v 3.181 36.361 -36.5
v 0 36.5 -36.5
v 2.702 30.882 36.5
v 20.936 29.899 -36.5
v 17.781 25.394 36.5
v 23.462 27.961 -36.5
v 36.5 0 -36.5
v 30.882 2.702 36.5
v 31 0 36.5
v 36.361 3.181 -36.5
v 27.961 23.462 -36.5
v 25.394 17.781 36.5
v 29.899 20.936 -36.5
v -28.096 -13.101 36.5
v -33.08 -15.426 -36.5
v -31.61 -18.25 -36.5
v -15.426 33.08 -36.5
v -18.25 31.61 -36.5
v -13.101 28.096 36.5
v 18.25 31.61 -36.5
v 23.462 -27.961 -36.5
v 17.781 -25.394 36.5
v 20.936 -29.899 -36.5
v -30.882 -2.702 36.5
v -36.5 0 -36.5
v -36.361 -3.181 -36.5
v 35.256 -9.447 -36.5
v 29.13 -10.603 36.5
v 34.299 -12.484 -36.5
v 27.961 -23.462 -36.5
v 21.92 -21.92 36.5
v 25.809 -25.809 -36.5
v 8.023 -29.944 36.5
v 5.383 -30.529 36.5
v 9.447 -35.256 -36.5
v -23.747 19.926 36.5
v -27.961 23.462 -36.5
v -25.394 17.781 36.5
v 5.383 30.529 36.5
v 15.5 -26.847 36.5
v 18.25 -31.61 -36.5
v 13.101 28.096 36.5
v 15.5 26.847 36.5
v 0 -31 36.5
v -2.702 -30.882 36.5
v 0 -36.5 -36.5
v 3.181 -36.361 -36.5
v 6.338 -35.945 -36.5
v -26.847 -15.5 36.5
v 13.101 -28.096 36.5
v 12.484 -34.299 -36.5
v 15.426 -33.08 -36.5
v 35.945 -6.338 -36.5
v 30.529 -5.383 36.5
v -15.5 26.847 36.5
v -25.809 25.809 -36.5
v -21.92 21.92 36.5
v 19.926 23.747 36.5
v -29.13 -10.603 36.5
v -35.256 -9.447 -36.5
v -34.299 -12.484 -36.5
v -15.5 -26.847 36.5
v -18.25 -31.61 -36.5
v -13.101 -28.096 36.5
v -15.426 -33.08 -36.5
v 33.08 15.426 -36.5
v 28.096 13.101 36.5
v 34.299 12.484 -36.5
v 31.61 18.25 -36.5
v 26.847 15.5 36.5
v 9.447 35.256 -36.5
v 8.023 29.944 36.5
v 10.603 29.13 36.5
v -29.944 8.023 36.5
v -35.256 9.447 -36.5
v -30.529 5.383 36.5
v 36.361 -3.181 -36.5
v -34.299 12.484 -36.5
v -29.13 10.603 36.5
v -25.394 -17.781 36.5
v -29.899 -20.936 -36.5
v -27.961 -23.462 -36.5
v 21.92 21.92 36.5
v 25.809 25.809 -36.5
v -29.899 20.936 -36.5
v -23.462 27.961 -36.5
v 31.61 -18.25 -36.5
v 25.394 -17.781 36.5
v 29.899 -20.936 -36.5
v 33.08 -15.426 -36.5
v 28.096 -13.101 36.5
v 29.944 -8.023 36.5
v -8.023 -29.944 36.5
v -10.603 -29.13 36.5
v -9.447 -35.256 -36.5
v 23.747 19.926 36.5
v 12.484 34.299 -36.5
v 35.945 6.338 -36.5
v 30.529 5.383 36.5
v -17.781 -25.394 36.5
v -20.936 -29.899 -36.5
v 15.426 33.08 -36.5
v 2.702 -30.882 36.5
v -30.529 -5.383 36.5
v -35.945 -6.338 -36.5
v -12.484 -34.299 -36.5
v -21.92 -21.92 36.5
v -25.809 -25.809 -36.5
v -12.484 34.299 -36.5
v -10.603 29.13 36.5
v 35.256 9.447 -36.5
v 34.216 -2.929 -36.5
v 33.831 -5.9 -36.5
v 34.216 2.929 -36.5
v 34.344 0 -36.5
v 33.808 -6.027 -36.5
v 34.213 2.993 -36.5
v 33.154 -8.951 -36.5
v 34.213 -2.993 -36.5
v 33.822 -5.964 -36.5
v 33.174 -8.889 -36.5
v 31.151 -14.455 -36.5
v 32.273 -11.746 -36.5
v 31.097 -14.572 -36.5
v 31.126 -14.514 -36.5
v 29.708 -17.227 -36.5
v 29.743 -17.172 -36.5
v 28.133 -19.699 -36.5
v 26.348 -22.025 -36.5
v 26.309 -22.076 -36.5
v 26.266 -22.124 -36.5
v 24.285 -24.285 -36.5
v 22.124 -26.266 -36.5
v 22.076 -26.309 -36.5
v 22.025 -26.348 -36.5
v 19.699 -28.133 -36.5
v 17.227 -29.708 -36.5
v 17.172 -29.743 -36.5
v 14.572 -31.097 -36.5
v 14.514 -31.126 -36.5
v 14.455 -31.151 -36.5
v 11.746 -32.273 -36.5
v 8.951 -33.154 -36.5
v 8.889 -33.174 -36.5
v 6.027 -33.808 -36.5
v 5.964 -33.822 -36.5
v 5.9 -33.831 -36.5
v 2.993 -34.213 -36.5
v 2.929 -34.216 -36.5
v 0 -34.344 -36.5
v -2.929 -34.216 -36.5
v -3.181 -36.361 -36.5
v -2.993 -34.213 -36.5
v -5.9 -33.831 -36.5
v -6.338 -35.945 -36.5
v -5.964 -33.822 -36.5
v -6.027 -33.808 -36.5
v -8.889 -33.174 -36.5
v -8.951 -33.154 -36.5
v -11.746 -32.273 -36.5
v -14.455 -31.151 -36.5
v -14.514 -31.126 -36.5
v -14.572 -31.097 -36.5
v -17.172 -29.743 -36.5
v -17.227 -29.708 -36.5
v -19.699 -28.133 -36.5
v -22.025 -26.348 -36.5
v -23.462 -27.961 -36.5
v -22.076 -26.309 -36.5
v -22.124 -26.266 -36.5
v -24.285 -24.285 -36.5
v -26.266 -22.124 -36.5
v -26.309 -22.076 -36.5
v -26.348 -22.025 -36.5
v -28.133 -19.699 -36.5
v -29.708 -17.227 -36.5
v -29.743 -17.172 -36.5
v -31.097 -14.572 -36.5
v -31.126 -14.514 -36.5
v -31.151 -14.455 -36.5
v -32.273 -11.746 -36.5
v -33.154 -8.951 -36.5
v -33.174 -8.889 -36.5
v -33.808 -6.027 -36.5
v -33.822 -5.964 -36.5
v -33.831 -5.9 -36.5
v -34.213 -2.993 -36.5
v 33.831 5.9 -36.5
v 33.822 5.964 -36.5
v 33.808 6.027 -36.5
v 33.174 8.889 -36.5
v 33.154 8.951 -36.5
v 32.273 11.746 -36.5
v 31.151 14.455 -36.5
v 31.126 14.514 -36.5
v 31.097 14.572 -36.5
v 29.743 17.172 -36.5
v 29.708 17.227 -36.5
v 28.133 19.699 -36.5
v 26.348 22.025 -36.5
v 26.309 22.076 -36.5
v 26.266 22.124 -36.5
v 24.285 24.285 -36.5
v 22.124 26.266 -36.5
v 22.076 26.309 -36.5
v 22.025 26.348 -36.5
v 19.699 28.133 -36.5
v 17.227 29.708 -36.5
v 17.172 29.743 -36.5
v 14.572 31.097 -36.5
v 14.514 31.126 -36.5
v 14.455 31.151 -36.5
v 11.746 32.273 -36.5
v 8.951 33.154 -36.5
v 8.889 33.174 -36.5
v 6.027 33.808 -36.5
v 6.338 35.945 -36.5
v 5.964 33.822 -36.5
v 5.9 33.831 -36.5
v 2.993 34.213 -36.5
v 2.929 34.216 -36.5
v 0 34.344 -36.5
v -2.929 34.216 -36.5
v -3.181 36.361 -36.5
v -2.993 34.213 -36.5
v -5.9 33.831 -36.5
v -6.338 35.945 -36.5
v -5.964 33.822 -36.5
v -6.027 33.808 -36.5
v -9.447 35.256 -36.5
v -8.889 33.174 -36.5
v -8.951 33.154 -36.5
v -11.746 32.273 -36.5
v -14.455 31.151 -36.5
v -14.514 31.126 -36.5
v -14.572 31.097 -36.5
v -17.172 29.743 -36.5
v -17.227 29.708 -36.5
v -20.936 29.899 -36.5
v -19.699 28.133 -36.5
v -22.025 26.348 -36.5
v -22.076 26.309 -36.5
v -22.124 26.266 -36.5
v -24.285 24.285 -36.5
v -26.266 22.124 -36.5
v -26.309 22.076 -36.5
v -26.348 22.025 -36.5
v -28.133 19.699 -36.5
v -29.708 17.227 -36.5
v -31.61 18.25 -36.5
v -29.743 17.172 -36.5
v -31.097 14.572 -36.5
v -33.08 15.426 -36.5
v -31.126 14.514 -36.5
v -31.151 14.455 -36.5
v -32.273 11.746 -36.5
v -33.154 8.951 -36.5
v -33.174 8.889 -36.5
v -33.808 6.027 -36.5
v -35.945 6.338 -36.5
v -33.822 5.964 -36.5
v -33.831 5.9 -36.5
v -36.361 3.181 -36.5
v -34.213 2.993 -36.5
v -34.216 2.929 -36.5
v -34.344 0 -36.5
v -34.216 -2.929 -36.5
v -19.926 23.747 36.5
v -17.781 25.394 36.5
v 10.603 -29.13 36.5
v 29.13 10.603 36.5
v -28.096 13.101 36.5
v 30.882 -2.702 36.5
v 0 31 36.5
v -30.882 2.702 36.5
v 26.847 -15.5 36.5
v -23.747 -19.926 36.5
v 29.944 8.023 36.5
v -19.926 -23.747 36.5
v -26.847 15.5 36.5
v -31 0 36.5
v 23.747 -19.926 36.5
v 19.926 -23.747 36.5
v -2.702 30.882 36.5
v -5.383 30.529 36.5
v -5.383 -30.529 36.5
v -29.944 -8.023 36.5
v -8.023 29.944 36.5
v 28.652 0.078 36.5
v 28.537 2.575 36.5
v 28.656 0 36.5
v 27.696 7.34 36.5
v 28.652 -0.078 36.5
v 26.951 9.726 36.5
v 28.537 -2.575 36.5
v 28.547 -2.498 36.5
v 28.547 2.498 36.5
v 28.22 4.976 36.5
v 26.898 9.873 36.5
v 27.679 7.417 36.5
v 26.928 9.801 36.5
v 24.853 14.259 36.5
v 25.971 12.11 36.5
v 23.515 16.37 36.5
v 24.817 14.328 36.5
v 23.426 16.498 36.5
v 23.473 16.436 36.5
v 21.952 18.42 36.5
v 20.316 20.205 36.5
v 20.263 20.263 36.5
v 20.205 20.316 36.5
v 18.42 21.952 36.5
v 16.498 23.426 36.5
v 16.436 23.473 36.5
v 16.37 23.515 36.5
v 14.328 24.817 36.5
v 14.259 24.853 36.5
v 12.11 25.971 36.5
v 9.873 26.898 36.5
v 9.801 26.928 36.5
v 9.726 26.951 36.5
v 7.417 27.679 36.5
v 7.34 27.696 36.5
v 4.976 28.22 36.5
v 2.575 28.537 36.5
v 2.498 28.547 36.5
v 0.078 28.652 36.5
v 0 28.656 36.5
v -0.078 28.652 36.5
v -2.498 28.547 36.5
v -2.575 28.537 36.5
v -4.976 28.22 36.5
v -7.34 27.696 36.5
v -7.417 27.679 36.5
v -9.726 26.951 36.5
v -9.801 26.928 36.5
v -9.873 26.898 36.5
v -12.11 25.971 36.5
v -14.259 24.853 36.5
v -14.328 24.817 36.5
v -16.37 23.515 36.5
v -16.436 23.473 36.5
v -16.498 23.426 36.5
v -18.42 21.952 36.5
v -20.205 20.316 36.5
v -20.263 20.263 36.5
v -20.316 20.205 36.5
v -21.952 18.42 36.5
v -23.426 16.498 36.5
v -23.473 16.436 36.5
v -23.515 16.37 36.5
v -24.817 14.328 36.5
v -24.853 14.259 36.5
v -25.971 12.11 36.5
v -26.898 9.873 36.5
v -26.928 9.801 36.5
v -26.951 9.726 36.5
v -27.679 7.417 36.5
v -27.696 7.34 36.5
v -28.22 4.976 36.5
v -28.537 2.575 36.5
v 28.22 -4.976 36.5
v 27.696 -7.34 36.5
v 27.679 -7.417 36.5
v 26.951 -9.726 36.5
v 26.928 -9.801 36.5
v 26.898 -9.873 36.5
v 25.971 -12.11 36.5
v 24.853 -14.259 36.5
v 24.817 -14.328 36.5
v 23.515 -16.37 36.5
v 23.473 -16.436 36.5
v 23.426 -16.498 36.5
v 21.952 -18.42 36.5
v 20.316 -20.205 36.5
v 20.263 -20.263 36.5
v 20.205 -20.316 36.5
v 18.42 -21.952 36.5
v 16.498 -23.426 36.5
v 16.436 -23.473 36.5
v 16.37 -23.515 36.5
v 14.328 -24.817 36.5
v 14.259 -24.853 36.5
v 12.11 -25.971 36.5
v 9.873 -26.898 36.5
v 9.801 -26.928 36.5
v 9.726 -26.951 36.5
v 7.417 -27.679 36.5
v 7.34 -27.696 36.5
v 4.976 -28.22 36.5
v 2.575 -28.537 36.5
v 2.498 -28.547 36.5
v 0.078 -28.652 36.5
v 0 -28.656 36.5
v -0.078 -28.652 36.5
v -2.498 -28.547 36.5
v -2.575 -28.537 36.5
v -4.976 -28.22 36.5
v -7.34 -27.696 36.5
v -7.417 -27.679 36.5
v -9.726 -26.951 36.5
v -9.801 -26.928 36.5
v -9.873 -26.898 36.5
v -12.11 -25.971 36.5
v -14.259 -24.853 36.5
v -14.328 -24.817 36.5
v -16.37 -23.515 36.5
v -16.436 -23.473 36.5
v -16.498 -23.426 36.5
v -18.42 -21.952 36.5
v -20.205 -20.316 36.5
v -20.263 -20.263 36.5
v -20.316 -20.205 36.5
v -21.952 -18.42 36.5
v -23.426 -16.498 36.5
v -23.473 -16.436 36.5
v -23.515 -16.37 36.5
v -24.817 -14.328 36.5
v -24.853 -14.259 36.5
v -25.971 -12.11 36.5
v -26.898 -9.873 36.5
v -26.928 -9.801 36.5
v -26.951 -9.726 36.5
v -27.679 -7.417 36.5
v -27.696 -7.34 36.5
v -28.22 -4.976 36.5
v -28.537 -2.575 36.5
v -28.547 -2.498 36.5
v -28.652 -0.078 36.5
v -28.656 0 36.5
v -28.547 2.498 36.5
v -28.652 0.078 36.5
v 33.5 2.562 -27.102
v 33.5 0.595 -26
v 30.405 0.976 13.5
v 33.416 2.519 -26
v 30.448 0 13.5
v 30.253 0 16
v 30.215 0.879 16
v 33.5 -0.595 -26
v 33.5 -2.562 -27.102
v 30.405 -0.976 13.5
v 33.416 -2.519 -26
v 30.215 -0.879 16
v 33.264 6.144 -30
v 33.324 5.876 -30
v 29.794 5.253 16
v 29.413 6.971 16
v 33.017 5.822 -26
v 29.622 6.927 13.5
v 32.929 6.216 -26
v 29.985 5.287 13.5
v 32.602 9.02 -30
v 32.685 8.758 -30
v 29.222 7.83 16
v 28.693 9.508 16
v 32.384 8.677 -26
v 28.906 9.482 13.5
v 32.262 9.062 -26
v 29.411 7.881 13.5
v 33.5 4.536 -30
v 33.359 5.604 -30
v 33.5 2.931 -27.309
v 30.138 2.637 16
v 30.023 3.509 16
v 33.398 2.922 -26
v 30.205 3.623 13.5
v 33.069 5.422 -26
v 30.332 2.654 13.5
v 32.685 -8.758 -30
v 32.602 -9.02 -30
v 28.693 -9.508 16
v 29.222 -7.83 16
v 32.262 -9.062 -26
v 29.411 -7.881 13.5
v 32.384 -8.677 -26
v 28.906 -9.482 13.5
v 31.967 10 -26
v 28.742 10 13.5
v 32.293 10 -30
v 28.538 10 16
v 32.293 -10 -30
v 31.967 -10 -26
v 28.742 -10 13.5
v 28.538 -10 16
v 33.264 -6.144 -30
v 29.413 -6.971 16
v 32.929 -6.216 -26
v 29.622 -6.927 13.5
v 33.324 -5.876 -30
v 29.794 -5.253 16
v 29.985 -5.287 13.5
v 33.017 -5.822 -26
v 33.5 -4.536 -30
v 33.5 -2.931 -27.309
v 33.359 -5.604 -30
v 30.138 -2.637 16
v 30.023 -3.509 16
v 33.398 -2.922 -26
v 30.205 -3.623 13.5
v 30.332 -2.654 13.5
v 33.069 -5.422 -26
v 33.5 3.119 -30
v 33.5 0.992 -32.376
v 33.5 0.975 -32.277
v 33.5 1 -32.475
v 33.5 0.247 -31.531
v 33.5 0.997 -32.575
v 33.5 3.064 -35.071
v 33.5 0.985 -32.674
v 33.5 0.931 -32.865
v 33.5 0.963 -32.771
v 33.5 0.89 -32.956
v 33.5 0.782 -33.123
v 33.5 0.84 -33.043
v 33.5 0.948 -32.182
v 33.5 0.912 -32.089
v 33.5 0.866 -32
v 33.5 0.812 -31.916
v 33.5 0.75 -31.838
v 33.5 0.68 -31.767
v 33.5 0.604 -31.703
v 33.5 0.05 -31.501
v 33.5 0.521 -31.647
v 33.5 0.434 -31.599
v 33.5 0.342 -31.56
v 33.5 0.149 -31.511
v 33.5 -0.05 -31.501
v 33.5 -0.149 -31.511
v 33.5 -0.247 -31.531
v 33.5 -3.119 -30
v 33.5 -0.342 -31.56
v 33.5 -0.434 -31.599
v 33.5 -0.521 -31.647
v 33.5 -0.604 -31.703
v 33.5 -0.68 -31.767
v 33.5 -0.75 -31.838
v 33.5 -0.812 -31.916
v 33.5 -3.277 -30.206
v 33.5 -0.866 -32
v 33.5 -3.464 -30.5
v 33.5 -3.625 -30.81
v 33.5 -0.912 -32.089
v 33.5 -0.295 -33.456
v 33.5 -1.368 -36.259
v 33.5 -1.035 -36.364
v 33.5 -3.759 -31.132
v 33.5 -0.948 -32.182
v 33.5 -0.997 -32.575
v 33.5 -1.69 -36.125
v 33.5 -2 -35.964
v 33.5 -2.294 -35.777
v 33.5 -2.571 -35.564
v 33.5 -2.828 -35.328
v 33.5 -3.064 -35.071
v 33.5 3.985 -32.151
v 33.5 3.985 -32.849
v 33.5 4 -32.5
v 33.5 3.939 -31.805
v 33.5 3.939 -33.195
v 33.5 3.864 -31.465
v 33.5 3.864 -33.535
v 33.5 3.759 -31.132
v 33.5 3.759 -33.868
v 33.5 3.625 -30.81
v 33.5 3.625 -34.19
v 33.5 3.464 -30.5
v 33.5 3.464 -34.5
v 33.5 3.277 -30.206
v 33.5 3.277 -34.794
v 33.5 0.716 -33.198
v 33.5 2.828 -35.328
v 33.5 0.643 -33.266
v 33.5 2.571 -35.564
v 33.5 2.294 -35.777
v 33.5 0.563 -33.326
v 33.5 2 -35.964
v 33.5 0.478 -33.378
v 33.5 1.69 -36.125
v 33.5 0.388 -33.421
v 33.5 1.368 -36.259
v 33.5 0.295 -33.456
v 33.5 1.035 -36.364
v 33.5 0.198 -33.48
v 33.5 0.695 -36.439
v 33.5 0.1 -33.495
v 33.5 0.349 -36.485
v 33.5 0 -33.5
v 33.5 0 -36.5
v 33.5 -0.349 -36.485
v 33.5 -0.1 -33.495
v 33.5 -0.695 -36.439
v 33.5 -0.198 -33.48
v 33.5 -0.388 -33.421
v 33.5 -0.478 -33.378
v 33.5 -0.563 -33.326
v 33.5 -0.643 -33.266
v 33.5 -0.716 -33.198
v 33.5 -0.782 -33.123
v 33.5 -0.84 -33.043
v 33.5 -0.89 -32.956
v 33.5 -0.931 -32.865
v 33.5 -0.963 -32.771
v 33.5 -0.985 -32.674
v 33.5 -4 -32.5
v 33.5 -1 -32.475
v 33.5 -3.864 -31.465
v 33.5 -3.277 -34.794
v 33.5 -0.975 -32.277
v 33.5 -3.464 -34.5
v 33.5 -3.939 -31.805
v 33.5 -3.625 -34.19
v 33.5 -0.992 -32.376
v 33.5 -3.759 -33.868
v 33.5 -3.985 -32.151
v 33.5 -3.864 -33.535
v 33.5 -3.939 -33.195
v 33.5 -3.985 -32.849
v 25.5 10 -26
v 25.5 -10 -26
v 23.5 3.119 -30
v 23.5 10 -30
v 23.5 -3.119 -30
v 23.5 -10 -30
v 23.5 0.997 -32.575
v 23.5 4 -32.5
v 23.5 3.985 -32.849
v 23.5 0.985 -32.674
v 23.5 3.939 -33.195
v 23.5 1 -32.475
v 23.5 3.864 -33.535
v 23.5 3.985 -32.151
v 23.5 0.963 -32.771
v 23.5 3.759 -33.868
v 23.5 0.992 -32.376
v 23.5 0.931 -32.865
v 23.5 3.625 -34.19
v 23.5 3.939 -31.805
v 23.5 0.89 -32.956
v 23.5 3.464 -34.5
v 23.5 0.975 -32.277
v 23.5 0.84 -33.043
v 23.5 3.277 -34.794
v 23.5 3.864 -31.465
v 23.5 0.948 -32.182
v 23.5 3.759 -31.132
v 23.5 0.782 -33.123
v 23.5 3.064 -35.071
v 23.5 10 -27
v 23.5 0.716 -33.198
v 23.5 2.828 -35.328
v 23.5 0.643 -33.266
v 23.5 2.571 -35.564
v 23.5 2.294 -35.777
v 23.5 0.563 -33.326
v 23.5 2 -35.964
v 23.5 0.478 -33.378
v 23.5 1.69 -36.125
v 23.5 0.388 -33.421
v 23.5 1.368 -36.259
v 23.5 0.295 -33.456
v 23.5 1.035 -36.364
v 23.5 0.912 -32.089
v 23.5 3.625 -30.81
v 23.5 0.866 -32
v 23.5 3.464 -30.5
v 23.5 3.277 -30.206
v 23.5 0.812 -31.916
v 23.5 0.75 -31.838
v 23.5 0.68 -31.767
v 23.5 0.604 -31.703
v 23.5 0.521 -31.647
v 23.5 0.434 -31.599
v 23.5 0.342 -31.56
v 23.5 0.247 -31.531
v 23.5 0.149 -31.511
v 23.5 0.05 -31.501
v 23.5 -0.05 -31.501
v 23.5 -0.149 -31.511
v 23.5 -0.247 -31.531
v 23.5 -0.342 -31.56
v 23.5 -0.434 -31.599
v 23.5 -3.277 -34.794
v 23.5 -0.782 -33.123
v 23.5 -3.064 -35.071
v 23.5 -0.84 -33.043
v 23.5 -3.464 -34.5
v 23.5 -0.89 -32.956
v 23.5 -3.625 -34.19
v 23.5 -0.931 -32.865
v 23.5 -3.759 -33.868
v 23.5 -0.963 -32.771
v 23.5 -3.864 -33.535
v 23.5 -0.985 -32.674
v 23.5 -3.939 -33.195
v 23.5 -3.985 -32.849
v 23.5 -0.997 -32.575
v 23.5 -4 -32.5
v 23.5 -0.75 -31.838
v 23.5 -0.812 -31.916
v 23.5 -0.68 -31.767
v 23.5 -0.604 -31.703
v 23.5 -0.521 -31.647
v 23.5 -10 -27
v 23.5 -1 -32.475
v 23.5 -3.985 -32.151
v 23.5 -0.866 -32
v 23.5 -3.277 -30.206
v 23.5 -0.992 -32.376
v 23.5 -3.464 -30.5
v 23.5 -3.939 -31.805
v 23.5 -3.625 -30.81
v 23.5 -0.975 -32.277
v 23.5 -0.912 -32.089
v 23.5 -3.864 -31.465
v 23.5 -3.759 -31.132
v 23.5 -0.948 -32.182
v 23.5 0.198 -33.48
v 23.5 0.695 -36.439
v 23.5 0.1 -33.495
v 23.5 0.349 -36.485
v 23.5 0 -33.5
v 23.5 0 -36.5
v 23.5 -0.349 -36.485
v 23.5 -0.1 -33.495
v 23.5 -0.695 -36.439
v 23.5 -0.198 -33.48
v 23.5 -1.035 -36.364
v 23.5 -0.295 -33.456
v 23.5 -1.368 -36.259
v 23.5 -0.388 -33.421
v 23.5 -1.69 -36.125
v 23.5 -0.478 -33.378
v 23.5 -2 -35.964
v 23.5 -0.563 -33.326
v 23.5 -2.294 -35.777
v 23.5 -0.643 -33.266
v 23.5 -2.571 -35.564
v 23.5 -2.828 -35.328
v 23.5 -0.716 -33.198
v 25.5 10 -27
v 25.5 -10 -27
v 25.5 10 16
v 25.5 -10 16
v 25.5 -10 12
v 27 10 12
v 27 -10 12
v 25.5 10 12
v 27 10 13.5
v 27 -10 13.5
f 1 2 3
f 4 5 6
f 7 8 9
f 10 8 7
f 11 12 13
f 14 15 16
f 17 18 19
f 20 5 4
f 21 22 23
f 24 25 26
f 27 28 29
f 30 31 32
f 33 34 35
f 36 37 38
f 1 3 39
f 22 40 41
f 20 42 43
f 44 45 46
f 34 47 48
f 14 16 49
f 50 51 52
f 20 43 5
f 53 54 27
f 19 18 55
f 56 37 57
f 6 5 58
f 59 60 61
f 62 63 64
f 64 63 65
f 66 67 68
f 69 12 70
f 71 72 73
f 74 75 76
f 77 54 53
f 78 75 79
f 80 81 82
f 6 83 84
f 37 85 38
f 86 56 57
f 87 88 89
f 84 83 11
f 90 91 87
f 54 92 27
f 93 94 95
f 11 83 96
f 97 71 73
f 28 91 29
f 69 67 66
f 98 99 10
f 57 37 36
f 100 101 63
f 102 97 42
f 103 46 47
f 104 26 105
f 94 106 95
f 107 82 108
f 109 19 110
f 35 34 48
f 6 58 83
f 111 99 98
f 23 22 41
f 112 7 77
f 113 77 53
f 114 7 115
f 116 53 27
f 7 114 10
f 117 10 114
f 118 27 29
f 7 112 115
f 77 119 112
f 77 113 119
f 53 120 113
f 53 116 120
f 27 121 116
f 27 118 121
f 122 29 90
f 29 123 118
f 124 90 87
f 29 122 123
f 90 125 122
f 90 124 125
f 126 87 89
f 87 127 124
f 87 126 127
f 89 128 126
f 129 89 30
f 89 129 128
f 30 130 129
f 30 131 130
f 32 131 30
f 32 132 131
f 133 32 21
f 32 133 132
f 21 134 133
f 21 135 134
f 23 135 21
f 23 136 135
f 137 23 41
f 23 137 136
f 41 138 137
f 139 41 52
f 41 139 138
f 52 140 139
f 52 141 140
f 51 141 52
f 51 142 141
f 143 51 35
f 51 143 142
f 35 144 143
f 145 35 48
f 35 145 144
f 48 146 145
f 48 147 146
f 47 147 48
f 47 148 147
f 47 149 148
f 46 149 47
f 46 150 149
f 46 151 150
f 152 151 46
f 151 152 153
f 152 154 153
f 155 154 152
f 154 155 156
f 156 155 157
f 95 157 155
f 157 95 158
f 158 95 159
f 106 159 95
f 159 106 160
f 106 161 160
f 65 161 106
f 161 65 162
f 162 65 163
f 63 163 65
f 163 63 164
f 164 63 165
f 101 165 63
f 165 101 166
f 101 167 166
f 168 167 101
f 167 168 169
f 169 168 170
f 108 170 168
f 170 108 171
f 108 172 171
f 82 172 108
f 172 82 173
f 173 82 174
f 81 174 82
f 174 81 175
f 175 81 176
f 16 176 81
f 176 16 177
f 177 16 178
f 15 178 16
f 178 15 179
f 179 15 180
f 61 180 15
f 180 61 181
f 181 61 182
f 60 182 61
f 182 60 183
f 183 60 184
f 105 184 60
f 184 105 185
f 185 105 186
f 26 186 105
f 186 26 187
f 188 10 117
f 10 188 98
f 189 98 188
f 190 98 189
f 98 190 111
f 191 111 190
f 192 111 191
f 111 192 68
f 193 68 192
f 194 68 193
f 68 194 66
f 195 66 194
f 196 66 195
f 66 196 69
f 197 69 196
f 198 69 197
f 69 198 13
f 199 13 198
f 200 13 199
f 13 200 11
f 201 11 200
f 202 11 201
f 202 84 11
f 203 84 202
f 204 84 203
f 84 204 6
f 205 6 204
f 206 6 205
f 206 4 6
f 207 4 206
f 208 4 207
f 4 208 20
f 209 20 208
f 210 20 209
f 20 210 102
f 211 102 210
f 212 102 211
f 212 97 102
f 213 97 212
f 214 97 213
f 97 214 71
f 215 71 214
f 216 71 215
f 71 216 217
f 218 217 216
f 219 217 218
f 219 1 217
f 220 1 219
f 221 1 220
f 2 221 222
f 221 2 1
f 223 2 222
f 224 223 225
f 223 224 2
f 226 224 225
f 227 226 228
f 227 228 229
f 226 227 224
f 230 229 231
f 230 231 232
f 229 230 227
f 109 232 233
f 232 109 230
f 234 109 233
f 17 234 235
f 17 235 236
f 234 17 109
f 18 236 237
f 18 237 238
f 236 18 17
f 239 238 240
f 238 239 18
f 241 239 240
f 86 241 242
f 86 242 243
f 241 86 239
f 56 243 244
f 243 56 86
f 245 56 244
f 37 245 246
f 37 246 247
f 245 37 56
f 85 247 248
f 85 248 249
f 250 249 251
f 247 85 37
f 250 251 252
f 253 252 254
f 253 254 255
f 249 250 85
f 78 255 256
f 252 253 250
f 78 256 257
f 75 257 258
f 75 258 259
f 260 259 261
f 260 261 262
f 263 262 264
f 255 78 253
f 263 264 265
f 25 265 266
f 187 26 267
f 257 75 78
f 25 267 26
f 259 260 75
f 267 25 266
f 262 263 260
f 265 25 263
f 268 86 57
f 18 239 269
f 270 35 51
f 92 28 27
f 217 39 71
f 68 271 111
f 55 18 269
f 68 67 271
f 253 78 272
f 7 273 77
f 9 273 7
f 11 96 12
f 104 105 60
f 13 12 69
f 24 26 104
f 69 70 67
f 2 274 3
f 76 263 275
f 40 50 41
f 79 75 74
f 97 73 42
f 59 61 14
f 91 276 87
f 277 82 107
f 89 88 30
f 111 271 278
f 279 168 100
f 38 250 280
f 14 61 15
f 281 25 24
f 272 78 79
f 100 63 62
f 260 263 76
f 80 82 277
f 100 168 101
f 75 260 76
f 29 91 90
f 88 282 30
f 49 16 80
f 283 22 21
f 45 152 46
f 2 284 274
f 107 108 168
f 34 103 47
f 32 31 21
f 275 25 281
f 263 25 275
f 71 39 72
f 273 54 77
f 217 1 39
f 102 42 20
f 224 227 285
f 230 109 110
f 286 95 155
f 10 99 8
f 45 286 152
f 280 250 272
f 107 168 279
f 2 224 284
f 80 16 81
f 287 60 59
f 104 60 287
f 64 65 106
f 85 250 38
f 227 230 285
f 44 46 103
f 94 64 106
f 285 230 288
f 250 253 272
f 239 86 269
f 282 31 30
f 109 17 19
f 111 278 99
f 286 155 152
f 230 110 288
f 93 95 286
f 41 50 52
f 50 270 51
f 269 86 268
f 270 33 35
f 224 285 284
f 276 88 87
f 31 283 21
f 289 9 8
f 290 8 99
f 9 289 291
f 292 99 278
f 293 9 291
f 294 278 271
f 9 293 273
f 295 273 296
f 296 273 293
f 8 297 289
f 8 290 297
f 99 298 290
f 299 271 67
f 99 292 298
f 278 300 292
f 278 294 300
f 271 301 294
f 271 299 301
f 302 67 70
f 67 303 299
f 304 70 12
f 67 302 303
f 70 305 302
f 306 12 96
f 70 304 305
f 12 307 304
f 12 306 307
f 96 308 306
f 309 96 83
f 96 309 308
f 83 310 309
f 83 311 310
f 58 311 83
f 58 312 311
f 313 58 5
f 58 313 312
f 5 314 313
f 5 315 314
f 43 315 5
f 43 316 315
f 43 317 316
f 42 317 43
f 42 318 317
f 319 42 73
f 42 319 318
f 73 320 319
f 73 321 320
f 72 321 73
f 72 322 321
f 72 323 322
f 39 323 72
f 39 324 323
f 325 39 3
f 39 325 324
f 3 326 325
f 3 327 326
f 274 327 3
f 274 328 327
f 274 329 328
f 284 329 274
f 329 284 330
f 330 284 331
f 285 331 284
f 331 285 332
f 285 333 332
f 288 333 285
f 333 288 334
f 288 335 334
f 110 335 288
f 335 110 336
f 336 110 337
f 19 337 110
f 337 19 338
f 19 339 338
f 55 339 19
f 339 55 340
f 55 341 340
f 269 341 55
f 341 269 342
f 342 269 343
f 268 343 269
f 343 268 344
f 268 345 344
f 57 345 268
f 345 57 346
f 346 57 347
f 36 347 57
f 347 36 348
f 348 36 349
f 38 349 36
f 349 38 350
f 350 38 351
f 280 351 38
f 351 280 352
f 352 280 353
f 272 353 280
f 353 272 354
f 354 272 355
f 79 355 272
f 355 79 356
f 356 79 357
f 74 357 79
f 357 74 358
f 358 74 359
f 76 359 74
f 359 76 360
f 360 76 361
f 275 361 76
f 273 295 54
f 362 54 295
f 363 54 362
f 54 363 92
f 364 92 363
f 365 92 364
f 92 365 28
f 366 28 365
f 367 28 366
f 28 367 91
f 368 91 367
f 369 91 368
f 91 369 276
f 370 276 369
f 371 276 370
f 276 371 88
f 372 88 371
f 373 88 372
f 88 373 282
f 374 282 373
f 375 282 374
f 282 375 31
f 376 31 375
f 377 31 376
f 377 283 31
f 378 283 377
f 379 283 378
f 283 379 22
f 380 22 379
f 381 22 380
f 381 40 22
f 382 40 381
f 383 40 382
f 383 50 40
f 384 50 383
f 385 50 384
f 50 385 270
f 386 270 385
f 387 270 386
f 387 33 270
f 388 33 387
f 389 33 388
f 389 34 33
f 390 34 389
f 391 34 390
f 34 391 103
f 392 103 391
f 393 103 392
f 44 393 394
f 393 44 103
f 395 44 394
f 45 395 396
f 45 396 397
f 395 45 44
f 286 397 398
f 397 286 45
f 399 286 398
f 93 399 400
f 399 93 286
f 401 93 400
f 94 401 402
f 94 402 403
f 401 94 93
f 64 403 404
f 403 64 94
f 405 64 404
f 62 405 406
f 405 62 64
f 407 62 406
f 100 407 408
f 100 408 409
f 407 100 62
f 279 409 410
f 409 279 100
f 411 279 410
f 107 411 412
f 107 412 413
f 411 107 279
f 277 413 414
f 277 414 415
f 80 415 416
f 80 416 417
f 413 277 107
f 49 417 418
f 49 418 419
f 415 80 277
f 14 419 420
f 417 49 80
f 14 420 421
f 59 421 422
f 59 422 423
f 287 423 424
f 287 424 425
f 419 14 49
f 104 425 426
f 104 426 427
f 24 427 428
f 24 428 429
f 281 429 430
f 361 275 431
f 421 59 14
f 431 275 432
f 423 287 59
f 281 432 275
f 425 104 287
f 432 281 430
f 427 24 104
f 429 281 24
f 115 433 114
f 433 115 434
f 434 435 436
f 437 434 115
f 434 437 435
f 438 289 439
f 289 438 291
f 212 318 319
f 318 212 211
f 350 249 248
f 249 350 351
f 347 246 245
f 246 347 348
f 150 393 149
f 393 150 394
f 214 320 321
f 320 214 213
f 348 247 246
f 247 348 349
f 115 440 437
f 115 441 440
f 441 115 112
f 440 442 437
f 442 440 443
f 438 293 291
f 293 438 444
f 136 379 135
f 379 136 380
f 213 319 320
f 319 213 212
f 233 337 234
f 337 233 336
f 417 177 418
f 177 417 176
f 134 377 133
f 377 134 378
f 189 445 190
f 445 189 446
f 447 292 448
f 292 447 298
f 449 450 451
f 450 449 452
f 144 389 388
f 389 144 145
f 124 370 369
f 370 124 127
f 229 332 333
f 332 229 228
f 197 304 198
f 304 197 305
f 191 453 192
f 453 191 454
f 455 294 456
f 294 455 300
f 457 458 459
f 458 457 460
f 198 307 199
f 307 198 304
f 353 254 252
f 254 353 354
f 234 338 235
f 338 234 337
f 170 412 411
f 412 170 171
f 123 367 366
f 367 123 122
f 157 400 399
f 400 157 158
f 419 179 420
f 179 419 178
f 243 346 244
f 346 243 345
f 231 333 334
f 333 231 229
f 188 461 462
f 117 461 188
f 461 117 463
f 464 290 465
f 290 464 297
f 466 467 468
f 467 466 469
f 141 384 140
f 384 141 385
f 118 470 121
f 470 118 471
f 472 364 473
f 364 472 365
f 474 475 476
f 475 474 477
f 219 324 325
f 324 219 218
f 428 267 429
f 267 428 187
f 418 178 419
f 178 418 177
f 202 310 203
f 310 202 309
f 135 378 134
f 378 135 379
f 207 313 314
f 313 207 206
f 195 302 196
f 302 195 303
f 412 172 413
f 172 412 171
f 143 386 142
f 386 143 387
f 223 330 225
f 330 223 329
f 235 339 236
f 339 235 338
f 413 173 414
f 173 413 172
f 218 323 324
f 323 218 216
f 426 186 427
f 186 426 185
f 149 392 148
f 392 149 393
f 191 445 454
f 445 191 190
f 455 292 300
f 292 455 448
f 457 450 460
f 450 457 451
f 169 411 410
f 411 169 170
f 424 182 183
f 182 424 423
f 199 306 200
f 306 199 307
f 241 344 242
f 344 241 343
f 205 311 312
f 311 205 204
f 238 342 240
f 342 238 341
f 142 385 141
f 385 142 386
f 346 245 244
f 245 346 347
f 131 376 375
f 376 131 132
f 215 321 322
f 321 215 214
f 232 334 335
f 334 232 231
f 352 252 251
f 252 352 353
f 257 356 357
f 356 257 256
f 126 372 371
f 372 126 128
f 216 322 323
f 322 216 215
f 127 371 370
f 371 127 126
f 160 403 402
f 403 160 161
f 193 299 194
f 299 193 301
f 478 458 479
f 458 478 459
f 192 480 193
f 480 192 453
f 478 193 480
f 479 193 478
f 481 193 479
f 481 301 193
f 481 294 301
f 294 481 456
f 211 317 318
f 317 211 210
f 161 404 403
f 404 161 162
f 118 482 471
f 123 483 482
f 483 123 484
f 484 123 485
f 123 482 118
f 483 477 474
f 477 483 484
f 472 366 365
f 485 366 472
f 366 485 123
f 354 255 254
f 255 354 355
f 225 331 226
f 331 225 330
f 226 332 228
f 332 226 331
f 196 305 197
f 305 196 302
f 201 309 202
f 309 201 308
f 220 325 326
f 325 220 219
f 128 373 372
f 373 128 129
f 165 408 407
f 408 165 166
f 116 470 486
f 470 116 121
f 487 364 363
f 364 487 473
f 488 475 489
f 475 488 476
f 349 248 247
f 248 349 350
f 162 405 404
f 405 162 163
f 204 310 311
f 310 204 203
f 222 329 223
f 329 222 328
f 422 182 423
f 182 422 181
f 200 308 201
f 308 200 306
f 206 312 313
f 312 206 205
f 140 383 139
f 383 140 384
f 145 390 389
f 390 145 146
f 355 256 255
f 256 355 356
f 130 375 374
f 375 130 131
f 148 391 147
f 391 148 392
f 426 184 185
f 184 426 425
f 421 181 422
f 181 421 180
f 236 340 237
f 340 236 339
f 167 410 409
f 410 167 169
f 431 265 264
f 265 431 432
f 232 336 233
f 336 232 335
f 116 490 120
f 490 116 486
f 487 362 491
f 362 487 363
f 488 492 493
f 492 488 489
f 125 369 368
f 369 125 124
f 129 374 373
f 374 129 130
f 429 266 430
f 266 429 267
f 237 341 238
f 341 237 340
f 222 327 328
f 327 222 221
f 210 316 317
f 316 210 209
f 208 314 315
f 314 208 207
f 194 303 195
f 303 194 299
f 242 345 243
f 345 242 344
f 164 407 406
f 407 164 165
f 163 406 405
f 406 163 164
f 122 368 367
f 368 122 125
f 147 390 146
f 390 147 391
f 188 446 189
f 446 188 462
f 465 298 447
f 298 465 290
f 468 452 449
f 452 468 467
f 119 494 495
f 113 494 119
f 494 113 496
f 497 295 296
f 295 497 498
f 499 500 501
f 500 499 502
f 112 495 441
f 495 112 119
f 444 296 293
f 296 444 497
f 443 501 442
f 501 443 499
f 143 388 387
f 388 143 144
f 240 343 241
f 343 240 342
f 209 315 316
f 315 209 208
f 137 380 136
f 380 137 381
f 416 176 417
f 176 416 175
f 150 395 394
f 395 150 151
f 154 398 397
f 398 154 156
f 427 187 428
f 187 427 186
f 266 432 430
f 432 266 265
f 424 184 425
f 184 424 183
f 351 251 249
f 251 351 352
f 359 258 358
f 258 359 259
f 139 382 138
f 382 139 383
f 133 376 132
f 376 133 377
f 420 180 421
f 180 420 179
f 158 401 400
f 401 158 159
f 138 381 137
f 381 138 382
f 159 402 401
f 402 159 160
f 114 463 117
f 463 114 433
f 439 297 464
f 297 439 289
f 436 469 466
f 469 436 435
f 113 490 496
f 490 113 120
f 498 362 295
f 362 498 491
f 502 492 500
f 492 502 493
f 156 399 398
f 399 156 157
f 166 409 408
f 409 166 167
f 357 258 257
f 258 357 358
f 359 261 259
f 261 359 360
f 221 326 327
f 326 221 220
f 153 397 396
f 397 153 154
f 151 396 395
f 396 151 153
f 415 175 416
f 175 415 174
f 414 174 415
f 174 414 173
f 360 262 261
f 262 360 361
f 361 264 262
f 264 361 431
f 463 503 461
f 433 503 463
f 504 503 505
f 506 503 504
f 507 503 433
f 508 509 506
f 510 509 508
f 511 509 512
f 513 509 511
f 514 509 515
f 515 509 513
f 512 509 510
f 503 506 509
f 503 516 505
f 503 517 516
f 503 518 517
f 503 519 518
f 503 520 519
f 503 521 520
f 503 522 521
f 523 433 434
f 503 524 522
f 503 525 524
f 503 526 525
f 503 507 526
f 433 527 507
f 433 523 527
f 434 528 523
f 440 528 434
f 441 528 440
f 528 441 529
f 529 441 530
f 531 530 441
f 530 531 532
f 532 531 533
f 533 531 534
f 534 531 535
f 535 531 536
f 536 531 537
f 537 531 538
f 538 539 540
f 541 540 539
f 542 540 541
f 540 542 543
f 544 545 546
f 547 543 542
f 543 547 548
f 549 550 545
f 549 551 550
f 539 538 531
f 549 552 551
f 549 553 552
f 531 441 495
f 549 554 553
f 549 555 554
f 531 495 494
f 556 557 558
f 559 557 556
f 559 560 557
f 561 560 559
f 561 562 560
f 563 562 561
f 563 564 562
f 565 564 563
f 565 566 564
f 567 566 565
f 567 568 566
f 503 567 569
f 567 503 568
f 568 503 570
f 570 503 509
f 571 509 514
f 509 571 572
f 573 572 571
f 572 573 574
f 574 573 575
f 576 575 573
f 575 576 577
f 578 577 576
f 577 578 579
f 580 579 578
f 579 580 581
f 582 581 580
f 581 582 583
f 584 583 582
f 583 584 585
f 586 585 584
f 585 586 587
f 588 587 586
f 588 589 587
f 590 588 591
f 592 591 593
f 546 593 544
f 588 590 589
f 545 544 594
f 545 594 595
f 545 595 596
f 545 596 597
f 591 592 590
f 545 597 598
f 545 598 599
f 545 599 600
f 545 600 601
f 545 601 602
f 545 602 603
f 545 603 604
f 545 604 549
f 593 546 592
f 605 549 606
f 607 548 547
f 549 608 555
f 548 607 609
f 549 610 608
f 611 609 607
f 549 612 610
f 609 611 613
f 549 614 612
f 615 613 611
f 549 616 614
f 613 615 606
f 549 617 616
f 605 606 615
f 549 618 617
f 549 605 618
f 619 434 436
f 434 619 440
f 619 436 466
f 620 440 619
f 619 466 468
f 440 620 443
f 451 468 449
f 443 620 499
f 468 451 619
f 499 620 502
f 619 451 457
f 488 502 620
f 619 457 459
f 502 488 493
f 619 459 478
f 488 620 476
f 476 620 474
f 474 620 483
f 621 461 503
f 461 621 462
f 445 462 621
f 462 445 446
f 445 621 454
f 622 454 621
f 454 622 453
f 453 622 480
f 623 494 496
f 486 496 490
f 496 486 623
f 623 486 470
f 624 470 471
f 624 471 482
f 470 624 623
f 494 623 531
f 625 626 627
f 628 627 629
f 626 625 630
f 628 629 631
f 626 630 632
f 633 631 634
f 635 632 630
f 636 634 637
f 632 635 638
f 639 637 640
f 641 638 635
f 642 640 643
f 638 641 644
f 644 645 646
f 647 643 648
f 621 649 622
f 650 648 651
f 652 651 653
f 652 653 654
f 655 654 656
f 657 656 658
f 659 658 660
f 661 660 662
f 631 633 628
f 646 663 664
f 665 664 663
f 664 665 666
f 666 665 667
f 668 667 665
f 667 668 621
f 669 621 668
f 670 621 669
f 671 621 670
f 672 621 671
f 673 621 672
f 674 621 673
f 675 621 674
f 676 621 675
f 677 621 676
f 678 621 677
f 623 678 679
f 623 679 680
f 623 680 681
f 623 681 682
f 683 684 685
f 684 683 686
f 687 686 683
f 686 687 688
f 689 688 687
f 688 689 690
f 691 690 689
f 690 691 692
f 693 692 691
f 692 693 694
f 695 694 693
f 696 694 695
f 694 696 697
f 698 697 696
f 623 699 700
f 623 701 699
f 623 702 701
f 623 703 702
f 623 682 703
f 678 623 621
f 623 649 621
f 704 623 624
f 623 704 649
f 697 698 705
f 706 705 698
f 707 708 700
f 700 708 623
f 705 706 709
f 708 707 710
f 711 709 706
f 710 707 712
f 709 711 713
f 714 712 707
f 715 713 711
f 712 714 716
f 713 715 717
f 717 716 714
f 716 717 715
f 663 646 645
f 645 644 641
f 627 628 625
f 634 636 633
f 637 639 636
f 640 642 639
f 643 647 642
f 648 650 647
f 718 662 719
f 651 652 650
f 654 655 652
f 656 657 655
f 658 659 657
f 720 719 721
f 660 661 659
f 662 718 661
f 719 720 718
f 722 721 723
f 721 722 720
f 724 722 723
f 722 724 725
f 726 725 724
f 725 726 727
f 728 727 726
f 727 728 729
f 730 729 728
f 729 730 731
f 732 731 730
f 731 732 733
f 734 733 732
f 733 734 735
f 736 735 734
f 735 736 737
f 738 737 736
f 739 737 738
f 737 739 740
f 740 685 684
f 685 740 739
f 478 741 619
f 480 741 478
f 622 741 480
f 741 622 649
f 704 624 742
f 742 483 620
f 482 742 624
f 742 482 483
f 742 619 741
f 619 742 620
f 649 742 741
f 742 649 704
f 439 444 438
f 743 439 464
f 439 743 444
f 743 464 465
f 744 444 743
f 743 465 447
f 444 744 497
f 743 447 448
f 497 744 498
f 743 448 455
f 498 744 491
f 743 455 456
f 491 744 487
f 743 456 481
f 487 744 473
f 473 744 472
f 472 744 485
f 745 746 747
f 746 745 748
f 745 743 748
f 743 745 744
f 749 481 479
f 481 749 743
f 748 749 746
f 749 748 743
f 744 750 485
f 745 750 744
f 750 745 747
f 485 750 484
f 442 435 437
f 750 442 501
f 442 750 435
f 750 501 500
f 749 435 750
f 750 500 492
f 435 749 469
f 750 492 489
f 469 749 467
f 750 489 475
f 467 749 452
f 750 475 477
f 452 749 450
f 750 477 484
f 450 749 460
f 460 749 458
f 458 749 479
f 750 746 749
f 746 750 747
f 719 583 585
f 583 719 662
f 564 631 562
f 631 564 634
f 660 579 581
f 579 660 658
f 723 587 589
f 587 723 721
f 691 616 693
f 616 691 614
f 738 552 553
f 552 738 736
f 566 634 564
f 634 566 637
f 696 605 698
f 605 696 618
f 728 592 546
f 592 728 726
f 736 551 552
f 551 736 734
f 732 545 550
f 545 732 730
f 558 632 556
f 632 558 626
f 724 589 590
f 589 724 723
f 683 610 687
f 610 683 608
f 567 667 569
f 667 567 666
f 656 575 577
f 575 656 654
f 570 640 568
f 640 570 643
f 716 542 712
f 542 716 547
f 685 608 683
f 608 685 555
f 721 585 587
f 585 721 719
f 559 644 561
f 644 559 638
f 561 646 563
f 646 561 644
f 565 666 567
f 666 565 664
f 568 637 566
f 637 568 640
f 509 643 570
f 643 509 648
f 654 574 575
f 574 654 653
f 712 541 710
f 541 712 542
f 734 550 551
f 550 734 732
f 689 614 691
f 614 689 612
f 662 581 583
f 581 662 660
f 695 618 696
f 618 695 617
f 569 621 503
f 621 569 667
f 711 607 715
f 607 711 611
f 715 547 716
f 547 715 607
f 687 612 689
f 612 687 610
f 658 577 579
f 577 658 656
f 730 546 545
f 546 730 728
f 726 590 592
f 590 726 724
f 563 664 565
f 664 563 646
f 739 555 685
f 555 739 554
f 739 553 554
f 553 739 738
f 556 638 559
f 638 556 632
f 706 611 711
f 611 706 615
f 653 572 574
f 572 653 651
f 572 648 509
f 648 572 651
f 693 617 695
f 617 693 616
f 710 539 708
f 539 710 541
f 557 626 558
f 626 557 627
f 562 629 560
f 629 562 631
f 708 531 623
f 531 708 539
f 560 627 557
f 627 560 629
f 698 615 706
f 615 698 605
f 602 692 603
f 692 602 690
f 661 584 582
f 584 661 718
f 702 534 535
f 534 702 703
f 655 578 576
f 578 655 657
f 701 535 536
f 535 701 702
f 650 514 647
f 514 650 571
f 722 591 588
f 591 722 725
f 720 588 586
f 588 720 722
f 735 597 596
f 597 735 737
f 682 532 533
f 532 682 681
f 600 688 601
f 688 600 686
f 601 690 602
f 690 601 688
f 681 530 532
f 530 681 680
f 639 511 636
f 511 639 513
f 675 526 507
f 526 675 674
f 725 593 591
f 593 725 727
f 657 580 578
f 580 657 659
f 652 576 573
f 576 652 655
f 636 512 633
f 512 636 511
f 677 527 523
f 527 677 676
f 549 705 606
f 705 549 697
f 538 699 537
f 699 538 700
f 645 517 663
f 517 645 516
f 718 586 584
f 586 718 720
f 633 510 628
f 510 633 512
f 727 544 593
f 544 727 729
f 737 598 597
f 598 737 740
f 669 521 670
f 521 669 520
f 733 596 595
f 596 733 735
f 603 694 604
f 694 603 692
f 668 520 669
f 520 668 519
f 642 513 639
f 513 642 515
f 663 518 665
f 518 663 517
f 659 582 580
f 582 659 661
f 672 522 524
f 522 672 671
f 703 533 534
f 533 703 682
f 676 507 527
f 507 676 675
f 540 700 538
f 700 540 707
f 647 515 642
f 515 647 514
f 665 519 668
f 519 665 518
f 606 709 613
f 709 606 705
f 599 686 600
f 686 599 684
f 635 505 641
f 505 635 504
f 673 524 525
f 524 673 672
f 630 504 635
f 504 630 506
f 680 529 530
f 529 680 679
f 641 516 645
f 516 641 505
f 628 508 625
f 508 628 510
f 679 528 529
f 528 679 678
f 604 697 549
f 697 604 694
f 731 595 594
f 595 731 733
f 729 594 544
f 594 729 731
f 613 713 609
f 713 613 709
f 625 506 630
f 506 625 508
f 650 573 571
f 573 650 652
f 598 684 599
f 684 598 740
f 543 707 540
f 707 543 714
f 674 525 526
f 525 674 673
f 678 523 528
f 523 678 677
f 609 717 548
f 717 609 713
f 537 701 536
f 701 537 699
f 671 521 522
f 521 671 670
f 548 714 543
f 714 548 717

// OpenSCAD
// Lantern Sleeve
//
// ABS sleeve to hold circuit board for ship's lamp project
//
$fs = 0.1;  // Don't generate smaller facets than 0.1 mm
$fa = 5;    // Don't generate larger angles than 5 degrees

union() {
    sleeve();
    translate([2,0,6]) mountingBracket();
}

module clipShelf() {
    difference() {
        difference() {
            color("LimeGreen") cube([5,20,4],true);
            translate([2,0,-2]) color("Blue") cube([6,21,3], true);
        };
        sleeve();
    }
}

module bottomShelf() {
    difference() {
        translate([-3,0,0]) color("LimeGreen")  cube([10,20,4],true);
        translate([-7,0,2]) cube([2,21,2],true);
    }
}

module sleeve() {
    difference() {
        cylinder(73, 36.5, 31, true);
        cylinder(77, 34.5, 28.5, true);
    }
}

module board() {
    color("Red") cube([40,20,2], true);
}

module mountingBracket() {
  translate([29.5,0,-34]) bottomShelf();
  translate([26,0,8]) clipShelf();
  difference() {
    translate([26.5,0,-38.5]) rotate([0,90,0]) cylinder(10,4,4, true);
    translate([26,0,-38.5]) rotate([0,90,0]) cylinder(12,1,1, true);
  }
}
echo(version=version());
